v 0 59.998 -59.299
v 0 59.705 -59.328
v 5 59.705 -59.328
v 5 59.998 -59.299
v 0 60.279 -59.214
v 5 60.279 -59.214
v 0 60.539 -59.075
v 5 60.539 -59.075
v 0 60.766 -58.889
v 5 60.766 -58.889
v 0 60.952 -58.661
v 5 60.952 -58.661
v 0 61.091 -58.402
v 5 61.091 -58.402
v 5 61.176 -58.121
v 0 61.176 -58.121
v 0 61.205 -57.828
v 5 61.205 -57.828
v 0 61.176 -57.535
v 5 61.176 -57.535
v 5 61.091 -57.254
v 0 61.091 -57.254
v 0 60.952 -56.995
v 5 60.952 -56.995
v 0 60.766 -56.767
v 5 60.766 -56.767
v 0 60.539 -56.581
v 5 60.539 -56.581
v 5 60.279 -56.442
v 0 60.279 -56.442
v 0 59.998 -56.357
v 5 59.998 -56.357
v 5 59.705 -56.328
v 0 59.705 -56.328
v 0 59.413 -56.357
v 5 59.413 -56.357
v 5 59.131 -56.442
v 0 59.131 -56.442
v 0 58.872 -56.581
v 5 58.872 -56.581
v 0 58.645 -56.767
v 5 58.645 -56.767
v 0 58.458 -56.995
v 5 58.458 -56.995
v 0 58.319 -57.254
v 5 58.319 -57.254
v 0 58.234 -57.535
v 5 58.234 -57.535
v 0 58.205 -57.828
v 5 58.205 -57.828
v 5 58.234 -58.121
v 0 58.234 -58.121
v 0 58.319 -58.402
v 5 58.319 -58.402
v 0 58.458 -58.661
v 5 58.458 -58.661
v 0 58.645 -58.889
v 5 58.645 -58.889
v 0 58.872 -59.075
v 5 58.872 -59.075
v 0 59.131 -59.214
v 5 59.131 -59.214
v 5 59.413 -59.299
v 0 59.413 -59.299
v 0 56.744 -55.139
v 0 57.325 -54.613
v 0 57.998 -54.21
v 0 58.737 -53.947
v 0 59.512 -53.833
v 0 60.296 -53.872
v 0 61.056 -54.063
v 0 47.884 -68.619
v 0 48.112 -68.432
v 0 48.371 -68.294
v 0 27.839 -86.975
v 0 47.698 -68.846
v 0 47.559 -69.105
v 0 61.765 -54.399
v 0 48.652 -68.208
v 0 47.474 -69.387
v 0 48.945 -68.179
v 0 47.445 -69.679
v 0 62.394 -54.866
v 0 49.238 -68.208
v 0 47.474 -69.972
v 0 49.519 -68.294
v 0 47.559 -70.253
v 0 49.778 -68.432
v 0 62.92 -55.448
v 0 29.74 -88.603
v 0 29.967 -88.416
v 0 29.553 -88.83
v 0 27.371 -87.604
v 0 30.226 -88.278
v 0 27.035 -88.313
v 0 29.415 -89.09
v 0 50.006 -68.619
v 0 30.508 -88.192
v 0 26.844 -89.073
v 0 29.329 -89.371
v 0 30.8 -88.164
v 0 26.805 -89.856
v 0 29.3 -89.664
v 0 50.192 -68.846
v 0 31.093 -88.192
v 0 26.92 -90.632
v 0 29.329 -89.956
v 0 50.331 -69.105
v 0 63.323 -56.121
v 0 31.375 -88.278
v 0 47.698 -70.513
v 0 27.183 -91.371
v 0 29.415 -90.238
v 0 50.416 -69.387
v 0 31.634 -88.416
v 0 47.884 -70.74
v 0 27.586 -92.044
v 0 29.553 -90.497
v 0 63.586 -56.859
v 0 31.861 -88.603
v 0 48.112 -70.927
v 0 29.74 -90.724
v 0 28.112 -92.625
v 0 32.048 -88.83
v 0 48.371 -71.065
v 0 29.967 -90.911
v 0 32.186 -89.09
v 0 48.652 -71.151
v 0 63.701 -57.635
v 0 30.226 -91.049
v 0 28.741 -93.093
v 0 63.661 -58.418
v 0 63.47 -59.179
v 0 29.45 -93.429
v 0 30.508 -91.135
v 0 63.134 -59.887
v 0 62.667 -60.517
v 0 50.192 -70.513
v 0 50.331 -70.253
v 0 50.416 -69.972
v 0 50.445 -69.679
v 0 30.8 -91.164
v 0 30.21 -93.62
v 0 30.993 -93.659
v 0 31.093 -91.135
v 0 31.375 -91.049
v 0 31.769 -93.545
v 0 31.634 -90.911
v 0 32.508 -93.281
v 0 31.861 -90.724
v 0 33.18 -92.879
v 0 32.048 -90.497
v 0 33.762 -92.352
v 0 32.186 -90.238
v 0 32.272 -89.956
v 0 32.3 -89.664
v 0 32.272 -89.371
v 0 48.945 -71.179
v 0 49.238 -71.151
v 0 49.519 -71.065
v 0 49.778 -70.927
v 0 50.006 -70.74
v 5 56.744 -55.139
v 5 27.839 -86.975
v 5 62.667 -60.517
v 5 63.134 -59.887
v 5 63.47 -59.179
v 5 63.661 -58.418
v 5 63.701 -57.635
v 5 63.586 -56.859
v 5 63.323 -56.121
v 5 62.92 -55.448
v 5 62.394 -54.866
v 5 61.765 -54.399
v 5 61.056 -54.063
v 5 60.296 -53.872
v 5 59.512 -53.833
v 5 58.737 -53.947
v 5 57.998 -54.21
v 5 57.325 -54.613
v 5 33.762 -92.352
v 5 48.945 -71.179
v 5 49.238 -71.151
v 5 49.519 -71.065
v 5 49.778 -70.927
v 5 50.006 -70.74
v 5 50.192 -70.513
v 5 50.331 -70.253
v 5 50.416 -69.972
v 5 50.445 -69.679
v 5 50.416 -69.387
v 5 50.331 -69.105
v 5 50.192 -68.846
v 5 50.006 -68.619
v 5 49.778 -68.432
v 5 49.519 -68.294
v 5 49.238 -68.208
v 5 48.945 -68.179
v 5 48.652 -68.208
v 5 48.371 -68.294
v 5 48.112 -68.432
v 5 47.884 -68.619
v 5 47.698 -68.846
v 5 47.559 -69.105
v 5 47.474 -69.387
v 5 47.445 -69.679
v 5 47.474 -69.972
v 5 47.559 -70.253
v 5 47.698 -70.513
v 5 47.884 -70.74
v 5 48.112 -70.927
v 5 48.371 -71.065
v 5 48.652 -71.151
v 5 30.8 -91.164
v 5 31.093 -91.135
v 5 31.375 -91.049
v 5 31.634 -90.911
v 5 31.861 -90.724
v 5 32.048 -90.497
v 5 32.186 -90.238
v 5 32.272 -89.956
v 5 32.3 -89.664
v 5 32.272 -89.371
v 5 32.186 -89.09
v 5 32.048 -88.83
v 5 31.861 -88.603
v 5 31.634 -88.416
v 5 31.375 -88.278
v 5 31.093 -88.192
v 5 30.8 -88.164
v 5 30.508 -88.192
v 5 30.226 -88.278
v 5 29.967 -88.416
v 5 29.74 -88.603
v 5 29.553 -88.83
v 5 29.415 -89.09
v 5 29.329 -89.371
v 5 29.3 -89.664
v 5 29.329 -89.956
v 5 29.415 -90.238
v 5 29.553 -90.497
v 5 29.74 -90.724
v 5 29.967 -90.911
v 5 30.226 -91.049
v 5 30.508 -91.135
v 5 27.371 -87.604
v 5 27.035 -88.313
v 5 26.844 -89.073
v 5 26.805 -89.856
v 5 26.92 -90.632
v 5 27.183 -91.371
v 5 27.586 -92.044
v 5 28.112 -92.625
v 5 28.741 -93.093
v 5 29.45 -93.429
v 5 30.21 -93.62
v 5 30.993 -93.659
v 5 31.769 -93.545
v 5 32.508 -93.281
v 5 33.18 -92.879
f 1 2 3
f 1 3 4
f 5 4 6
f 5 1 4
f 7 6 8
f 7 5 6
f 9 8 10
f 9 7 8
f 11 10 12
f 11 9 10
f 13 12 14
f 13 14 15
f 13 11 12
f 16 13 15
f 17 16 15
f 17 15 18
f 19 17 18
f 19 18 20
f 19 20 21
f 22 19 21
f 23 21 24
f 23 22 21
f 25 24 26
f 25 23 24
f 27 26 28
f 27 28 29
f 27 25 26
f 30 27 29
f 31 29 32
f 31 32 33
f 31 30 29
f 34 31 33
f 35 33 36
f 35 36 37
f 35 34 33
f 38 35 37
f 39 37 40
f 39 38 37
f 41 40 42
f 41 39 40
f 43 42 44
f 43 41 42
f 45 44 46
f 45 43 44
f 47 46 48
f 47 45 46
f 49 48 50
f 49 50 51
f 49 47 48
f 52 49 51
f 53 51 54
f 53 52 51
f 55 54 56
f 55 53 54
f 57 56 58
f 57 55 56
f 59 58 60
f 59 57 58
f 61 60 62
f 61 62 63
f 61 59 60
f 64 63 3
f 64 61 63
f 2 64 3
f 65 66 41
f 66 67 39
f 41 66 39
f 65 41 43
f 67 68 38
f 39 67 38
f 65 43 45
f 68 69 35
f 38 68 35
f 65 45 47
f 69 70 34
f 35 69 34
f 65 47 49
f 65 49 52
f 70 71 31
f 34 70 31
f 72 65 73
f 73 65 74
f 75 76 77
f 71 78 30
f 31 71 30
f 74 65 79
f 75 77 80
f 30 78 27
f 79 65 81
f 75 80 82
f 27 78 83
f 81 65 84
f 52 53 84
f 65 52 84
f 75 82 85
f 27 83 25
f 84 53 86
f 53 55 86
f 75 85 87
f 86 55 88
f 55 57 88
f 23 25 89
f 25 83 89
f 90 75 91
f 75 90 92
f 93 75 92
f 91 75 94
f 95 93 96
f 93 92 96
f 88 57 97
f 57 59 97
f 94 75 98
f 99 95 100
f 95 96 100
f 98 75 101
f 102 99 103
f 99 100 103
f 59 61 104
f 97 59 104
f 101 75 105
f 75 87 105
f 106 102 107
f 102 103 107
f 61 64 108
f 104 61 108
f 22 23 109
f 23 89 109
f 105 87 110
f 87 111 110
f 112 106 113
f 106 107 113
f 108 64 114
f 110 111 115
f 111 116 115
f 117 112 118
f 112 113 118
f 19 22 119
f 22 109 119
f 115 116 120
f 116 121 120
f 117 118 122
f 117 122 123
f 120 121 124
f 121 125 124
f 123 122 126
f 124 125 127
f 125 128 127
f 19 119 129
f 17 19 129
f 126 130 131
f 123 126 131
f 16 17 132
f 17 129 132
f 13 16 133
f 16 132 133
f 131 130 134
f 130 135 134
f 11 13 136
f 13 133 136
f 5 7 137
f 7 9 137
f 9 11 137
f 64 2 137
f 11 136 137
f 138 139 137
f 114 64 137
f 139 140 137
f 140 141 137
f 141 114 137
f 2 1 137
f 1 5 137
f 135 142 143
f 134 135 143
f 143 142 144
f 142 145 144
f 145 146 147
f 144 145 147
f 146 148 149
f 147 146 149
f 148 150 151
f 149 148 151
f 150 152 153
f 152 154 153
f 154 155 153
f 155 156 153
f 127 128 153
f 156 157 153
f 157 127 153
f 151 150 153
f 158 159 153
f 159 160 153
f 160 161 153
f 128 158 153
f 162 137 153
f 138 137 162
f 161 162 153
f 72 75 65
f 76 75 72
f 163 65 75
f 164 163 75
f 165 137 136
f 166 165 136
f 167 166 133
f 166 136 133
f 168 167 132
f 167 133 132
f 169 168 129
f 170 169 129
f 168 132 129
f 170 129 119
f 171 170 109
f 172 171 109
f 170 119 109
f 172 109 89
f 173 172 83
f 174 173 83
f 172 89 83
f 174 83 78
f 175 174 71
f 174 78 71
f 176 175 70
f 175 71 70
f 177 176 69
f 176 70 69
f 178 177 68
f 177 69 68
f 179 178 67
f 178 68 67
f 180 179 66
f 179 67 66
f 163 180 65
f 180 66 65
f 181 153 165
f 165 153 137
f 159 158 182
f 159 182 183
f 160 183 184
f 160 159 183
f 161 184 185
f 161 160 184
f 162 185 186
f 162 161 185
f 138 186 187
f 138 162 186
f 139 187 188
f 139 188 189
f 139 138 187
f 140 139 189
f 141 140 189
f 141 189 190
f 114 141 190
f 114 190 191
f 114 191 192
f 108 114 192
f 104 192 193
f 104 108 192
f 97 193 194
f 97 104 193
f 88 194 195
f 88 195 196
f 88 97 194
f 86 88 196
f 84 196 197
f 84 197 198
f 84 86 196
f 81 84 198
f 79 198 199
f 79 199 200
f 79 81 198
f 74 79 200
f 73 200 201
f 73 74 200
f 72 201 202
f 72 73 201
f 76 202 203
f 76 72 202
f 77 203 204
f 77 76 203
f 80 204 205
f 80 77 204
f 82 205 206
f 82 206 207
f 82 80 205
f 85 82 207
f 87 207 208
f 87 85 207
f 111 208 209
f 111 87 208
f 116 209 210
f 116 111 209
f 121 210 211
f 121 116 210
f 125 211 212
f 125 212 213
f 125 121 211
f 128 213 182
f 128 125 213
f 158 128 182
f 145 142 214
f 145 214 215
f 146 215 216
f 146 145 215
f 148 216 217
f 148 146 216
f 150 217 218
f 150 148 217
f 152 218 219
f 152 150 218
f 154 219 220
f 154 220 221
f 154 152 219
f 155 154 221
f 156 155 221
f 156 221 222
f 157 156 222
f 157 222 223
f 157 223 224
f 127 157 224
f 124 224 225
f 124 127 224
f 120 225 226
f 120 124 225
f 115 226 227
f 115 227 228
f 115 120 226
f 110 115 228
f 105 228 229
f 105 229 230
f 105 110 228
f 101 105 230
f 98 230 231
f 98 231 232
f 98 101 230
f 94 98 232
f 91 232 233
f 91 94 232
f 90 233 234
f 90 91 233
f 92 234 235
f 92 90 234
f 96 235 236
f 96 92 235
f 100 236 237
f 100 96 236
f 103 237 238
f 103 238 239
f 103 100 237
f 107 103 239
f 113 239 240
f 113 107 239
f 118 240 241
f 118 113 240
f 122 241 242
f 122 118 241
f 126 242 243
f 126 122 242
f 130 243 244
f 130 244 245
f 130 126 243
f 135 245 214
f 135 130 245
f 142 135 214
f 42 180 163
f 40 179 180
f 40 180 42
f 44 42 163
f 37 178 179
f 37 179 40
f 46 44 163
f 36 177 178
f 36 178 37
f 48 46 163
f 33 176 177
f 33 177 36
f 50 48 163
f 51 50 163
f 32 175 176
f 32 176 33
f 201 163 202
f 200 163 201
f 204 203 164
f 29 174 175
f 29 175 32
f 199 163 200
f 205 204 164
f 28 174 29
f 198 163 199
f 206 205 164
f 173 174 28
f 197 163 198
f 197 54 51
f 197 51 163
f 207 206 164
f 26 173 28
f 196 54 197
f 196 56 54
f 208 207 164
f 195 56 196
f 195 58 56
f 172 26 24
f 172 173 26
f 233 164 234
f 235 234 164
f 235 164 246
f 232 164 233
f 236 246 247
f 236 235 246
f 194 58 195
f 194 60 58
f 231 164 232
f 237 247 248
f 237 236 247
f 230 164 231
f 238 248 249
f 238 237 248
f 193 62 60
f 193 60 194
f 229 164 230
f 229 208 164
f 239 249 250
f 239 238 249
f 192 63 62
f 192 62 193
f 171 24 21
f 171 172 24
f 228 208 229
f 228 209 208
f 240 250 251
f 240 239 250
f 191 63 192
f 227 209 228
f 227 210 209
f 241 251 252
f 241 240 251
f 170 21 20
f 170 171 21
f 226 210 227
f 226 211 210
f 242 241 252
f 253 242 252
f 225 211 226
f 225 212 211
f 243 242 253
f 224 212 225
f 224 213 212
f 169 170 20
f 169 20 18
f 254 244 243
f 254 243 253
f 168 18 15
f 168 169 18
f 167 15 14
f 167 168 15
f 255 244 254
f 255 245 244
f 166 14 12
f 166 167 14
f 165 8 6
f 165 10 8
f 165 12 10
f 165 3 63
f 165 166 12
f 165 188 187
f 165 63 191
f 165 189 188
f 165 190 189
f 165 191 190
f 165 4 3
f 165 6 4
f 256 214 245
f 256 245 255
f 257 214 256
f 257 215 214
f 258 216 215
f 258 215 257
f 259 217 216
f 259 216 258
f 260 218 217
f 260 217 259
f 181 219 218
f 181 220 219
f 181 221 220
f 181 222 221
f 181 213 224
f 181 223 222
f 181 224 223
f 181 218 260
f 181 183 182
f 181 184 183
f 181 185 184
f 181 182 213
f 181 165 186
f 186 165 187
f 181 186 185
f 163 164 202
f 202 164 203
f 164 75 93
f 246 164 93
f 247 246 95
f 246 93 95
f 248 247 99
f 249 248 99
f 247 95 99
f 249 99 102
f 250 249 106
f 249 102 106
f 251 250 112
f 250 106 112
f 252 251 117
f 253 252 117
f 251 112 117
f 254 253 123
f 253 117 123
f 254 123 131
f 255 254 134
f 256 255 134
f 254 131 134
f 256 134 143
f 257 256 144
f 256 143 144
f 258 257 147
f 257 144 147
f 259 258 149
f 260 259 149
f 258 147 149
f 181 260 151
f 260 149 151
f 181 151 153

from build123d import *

# Parameters (mm, degrees)
SKETCH2_R           = 1.5
SKETCH2_R_2         = 4
BOSS_EXTRUDE1_DEPTH = 5


with BuildPart() as part:
    # Sketch2 → Boss-Extrude1 (new body)
    with BuildSketch(Plane(origin=(0, 0, 0), x_dir=(0, 0, -1), z_dir=(1, 0, 0))):
        with BuildLine():
            Line((92.352467742, 33.761940445), (60.516758506, 62.666743117))
            ThreePointArc((60.516758506, 62.666743117), (61.485484965, 61.324652748), (61.827939653, 59.705281792))
            ThreePointArc((61.827939653, 59.705281792), (59.447310609, 56.047736481), (55.1391208, 56.743820468))
            Line((55.1391208, 56.743820468), (86.974830036, 27.839017797))
            ThreePointArc((86.974830036, 27.839017797), (86.702187565, 33.489297974), (92.352467742, 33.761940445))
        make_face()
        with Locations((69.679349119, 48.944954468)):
            Circle(SKETCH2_R, mode=Mode.SUBTRACT)
        with Locations((57.827939653, 59.705281792)):
            Circle(SKETCH2_R_2)
        with Locations((57.827939653, 59.705281792)):
            Circle(SKETCH2_R, mode=Mode.SUBTRACT)
        with Locations((89.663648889, 30.800479121)):
            Circle(SKETCH2_R_2)
        with Locations((89.663648889, 30.800479121)):
            Circle(SKETCH2_R, mode=Mode.SUBTRACT)
    extrude(amount=BOSS_EXTRUDE1_DEPTH)


solid = part.part
